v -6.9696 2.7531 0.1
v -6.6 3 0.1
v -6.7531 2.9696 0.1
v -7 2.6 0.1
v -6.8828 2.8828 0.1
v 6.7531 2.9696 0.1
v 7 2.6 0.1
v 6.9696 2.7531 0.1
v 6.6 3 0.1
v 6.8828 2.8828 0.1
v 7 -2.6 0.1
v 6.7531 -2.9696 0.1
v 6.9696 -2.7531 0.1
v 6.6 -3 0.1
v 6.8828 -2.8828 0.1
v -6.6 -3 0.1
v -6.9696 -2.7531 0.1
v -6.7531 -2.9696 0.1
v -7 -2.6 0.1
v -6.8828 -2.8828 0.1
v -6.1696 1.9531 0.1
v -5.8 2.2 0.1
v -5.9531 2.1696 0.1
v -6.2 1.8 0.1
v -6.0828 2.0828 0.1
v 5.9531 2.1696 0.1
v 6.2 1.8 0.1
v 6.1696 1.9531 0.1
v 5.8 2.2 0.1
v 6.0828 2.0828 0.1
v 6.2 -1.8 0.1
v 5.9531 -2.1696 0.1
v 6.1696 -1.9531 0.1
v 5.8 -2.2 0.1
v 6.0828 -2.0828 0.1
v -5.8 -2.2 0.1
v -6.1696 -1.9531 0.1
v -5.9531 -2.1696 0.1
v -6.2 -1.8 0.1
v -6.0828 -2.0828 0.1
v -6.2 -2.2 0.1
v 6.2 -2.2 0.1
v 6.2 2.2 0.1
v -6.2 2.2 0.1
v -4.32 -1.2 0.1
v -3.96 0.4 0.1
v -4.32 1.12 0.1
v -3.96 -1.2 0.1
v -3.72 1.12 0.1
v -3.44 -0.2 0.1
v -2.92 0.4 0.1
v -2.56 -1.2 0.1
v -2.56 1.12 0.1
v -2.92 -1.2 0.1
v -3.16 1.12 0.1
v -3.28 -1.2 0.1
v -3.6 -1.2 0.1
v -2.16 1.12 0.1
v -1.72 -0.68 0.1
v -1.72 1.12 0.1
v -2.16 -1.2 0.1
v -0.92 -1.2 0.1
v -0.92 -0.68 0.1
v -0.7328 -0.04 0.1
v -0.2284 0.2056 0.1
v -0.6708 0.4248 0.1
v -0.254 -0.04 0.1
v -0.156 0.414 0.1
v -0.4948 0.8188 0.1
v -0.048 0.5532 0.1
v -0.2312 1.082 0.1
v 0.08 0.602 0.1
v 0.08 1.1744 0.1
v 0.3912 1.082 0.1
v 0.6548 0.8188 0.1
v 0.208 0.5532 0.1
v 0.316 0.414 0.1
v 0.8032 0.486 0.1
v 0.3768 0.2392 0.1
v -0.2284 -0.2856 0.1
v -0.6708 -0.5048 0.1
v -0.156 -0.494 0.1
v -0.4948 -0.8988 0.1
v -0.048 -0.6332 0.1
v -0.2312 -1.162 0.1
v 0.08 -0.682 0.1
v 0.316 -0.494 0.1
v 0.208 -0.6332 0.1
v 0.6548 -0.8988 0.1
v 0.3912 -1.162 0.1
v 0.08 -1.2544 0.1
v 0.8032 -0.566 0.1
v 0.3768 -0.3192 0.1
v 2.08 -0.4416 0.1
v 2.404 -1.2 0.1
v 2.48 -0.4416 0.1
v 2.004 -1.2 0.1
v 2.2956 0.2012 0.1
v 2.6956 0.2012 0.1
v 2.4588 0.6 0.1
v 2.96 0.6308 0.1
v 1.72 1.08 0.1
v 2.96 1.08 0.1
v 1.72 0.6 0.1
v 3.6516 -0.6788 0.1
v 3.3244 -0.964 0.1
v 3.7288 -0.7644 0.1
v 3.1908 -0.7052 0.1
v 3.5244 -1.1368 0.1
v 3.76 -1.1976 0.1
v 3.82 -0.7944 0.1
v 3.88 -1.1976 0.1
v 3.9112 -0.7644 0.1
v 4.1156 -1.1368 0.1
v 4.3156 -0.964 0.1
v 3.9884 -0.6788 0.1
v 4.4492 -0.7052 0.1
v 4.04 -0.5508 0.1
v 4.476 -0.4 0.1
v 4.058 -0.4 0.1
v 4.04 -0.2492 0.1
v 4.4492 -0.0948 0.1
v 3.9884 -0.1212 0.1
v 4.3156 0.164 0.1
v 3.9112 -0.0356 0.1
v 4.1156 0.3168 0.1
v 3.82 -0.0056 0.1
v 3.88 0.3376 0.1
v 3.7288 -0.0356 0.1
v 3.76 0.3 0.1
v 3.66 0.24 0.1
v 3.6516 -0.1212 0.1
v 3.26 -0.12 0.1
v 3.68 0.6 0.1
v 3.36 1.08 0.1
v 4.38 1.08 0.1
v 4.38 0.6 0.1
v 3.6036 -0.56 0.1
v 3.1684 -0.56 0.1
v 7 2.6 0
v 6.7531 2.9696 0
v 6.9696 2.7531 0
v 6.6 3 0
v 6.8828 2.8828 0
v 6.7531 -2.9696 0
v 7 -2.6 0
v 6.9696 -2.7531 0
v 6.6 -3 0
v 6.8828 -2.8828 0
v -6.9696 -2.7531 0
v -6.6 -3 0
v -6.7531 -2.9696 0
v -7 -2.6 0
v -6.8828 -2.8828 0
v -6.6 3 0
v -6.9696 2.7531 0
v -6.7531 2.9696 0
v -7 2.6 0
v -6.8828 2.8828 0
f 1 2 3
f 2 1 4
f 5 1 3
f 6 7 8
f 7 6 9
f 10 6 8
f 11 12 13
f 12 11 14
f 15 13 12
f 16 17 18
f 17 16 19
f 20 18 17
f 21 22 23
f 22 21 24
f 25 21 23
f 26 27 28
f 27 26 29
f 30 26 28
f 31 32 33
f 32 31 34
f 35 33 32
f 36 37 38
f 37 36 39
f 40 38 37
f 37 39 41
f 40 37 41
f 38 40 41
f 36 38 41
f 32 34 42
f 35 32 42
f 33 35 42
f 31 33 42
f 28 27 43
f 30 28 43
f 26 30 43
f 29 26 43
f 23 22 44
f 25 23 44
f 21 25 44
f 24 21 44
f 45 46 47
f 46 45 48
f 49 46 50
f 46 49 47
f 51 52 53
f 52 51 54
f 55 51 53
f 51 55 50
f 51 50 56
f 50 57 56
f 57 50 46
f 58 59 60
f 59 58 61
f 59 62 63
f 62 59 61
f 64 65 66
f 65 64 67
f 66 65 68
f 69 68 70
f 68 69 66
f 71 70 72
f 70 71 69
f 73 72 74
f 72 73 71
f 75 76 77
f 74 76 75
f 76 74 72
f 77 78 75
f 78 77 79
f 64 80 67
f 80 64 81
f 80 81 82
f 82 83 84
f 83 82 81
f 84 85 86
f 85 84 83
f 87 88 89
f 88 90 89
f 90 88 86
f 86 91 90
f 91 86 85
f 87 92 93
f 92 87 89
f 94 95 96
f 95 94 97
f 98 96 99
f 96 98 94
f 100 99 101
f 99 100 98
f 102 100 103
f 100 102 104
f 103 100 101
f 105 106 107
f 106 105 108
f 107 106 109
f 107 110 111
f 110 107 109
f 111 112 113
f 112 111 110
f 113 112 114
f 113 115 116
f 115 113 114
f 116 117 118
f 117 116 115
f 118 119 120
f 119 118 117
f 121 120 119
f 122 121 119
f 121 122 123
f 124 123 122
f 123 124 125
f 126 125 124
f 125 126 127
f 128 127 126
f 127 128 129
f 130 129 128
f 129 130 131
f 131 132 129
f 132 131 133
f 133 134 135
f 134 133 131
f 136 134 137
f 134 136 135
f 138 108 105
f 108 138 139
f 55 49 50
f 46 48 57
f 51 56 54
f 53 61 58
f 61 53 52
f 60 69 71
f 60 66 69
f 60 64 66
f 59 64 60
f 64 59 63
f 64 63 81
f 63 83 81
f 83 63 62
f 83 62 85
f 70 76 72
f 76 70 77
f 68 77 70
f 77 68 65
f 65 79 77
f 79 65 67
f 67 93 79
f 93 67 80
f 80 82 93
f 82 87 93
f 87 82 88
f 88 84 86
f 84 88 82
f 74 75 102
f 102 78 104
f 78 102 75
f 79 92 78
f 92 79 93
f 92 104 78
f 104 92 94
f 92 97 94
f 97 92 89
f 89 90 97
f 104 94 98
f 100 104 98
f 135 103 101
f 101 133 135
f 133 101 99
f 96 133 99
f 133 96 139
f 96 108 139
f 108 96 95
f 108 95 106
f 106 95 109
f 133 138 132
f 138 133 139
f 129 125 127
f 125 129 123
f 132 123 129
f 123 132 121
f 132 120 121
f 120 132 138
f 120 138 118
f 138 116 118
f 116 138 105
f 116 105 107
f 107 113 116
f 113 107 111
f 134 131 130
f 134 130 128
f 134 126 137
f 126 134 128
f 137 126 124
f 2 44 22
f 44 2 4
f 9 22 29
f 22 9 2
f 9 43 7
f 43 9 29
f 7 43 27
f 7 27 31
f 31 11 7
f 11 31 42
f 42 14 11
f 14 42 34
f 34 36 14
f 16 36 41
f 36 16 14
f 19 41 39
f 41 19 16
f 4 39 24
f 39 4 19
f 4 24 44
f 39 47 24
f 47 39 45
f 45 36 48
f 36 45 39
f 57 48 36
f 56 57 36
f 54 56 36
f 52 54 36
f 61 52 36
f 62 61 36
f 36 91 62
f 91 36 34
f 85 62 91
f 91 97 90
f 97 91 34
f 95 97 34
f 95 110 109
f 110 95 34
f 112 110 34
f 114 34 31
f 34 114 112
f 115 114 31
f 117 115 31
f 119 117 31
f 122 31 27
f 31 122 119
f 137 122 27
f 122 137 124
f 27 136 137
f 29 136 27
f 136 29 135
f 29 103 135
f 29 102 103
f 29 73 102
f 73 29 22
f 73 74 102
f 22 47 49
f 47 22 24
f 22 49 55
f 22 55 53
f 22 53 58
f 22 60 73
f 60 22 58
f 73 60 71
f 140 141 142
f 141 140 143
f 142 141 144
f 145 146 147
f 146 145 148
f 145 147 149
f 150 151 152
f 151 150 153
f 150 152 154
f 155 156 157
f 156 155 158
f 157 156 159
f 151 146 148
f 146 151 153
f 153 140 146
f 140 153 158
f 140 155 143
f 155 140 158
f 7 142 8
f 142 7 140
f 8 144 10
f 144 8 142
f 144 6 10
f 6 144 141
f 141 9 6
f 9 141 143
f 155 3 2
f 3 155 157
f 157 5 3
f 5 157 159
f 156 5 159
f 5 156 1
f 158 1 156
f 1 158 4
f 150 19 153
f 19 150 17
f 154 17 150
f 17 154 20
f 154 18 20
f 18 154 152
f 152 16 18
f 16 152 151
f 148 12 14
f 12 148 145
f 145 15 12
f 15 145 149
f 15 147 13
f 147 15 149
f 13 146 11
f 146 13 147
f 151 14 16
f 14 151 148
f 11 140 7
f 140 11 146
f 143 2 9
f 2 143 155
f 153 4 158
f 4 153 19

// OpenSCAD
// file: ../p/1-4ndis.scad
use <../lib.scad>
function ldraw_lib__1_4ndis() = [
// 0 Disc Negative 0.25
// 0 Name: 1-4ndis.dat
// 0 Author: James Jessiman
// 0 !LDRAW_ORG Primitive UPDATE 2012-01
// 0 !LICENSE Licensed under CC BY 4.0 : see CAreadme.txt
// 
// 0 BFC CERTIFY CCW
  [0,"BFC","CERTIFY"],
  [0,"BFC","CCW"],
// 
// 0 !HISTORY 2002-03-23 [sbliss] Added BFC Statement
// 0 !HISTORY 2002-04-25 [PTadmin] Official Update 2002-02
// 0 !HISTORY 2007-06-22 [PTadmin] Header formatted for Contributor Agreement
// 0 !HISTORY 2008-07-01 [PTadmin] Official Update 2008-01
// 0 !HISTORY 2012-02-16 [Philo] Changed to CCW
// 0 !HISTORY 2012-03-30 [PTadmin] Official Update 2012-01
// 
// 
// 3 16 0.9239 0 0.3827 1 0 0 1 0 1
  [3,16,0.9239,0,0.3827,1,0,0,1,0,1],
// 3 16 0.7071 0 0.7071 0.9239 0 0.3827 1 0 1
  [3,16,0.7071,0,0.7071,0.9239,0,0.3827,1,0,1],
// 3 16 0.3827 0 0.9239 0.7071 0 0.7071 1 0 1
  [3,16,0.3827,0,0.9239,0.7071,0,0.7071,1,0,1],
// 3 16 0 0 1 0.3827 0 0.9239 1 0 1
  [3,16,0,0,1,0.3827,0,0.9239,1,0,1],
];
module ldraw_lib__1_4ndis(step=0, col=false, unit=2/5, alt=false, line=0.2, solid=!$preview)
    makepoly(ldraw_lib__1_4ndis(), step=step, col=col, unit=unit, alt=alt, line=line, solid=solid);
ldraw_lib__1_4ndis(line=0.2);
// file: ../p/1-4cyli.scad
use <../lib.scad>
function ldraw_lib__1_4cyli() = [
// 0 Cylinder 0.25
// 0 Name: 1-4cyli.dat
// 0 Author: James Jessiman
// 0 !LDRAW_ORG Primitive UPDATE 2012-01
// 0 !LICENSE Licensed under CC BY 4.0 : see CAreadme.txt
// 
// 0 BFC CERTIFY CCW
  [0,"BFC","CERTIFY"],
  [0,"BFC","CCW"],
// 
// 0 !HISTORY 2002-03-23 [sbliss] Added BFC statement.
// 0 !HISTORY 2002-04-25 [PTadmin] Official Update 2002-02
// 0 !HISTORY 2007-06-22 [PTadmin] Header formatted for Contributor Agreement
// 0 !HISTORY 2008-07-01 [PTadmin] Official Update 2008-01
// 0 !HISTORY 2012-02-16 [Philo] Changed to CCW
// 0 !HISTORY 2012-03-30 [PTadmin] Official Update 2012-01
// 
// 
// 4 16 1 1 0 0.9239 1 0.3827 0.9239 0 0.3827 1 0 0
  [4,16,1,1,0,0.9239,1,0.3827,0.9239,0,0.3827,1,0,0],
// 5 24 1 0 0 1 1 0 0.9239 0 0.3827 1 0 -1
  [5,24,1,0,0,1,1,0,0.9239,0,0.3827,1,0,-1],
// 4 16 0.9239 1 0.3827 0.7071 1 0.7071 0.7071 0 0.7071 0.9239 0 0.3827
  [4,16,0.9239,1,0.3827,0.7071,1,0.7071,0.7071,0,0.7071,0.9239,0,0.3827],
// 5 24 0.9239 0 0.3827 0.9239 1 0.3827 0.7071 0 0.7071 1 0 0
  [5,24,0.9239,0,0.3827,0.9239,1,0.3827,0.7071,0,0.7071,1,0,0],
// 4 16 0.7071 1 0.7071 0.3827 1 0.9239 0.3827 0 0.9239 0.7071 0 0.7071
  [4,16,0.7071,1,0.7071,0.3827,1,0.9239,0.3827,0,0.9239,0.7071,0,0.7071],
// 5 24 0.7071 0 0.7071 0.7071 1 0.7071 0.3827 0 0.9239 0.9239 0 0.3827
  [5,24,0.7071,0,0.7071,0.7071,1,0.7071,0.3827,0,0.9239,0.9239,0,0.3827],
// 4 16 0.3827 1 0.9239 0 1 1 0 0 1 0.3827 0 0.9239
  [4,16,0.3827,1,0.9239,0,1,1,0,0,1,0.3827,0,0.9239],
// 5 24 0.3827 0 0.9239 0.3827 1 0.9239 0 0 1 0.7071 0 0.7071
  [5,24,0.3827,0,0.9239,0.3827,1,0.9239,0,0,1,0.7071,0,0.7071],
// 5 24 0 0 1 0 1 1 0.3827 0 0.9239 -1 0 1
  [5,24,0,0,1,0,1,1,0.3827,0,0.9239,-1,0,1],
];
module ldraw_lib__1_4cyli(step=0, col=false, unit=2/5, alt=false, line=0.2, solid=!$preview)
    makepoly(ldraw_lib__1_4cyli(), step=step, col=col, unit=unit, alt=alt, line=line, solid=solid);
ldraw_lib__1_4cyli(line=0.2);
// file: ../p/1-4chrd.scad
use <../lib.scad>
function ldraw_lib__1_4chrd() = [
// 0 Chord 0.25
// 0 Name: 1-4chrd.dat
// 0 Author: Max Martin Richter [MMR1988]
// 0 !LDRAW_ORG Primitive UPDATE 2023-05
// 0 !LICENSE Licensed under CC BY 4.0 : see CAreadme.txt
// 
// 0 BFC CERTIFY CCW
  [0,"BFC","CERTIFY"],
  [0,"BFC","CCW"],
// 
// 0 !HISTORY 2004-04-22 [PTadmin] Official Update 2004-02
// 0 !HISTORY 2007-10-09 [PTadmin] Header formatted for Contributor Agreement
// 0 !HISTORY 2008-07-01 [PTadmin] Official Update 2008-01
// 0 !HISTORY 2012-08-02 [MMR1988] Re-creation with PrimGen2 and Rectifier
// 0 !HISTORY 2012-08-09 [PTadmin] Official Update 2012-02
// 0 !HISTORY 2023-10-27 [OrionP] Change author to MMR1988 from hafhead
// 0 !HISTORY 2023-10-31 [OrionP] Official Update 2023-05
// 
// 4 16 0.9239 0 0.3827 0.3827 0 0.9239 0 0 1 1 0 0
  [4,16,0.9239,0,0.3827,0.3827,0,0.9239,0,0,1,1,0,0],
// 3 16 0.7071 0 0.7071 0.3827 0 0.9239 0.9239 0 0.3827
  [3,16,0.7071,0,0.7071,0.3827,0,0.9239,0.9239,0,0.3827],
];
module ldraw_lib__1_4chrd(step=0, col=false, unit=2/5, alt=false, line=0.2, solid=!$preview)
    makepoly(ldraw_lib__1_4chrd(), step=step, col=col, unit=unit, alt=alt, line=line, solid=solid);
ldraw_lib__1_4chrd(line=0.2);
// main file
use <../lib.scad>
use <../p/1-4chrd.scad>
use <../p/1-4cyli.scad>
use <../p/1-4ndis.scad>
function ldraw_lib__6152075a() = [
// 0 Sticker  0.7 x  1.7 with Black "MLC 75" and Black Border
// 0 Name: 6152075a.dat
// 0 Author: Evert-Jan Boer [ejboer]
// 0 !LDRAW_ORG Part UPDATE 2024-08
// 0 !LICENSE Licensed under CC BY 4.0 : see CAreadme.txt
// 
// 0 BFC CERTIFY CCW
  [0,"BFC","CERTIFY"],
  [0,"BFC","CCW"],
// 
// 0 !KEYWORDS London Mini Bus, Set 40220
// 
// 0 !HISTORY 2024-09-30 [OrionP] Official Update 2024-08
// 
// 
// 1 0 -16.5 -.25 6.5 0 0 -1 0 1 0 1 0 0 1-4chrd.dat
  [1,0,-16.5,-.25,6.5,0,0,-1,0,1,0,1,0,0, ldraw_lib__1_4chrd()],
// 1 0 16.5 -.25 6.5 1 0 0 0 1 0 0 0 1 1-4chrd.dat
  [1,0,16.5,-.25,6.5,1,0,0,0,1,0,0,0,1, ldraw_lib__1_4chrd()],
// 1 0 16.5 -.25 -6.5 0 0 1 0 1 0 -1 0 0 1-4chrd.dat
  [1,0,16.5,-.25,-6.5,0,0,1,0,1,0,-1,0,0, ldraw_lib__1_4chrd()],
// 1 0 -16.5 -.25 -6.5 -1 0 0 0 1 0 0 0 -1 1-4chrd.dat
  [1,0,-16.5,-.25,-6.5,-1,0,0,0,1,0,0,0,-1, ldraw_lib__1_4chrd()],
// 1 15 -14.5 -.25 4.5 0 0 -1 0 1 0 1 0 0 1-4chrd.dat
  [1,15,-14.5,-.25,4.5,0,0,-1,0,1,0,1,0,0, ldraw_lib__1_4chrd()],
// 1 15 14.5 -.25 4.5 1 0 0 0 1 0 0 0 1 1-4chrd.dat
  [1,15,14.5,-.25,4.5,1,0,0,0,1,0,0,0,1, ldraw_lib__1_4chrd()],
// 1 15 14.5 -.25 -4.5 0 0 1 0 1 0 -1 0 0 1-4chrd.dat
  [1,15,14.5,-.25,-4.5,0,0,1,0,1,0,-1,0,0, ldraw_lib__1_4chrd()],
// 1 15 -14.5 -.25 -4.5 -1 0 0 0 1 0 0 0 -1 1-4chrd.dat
  [1,15,-14.5,-.25,-4.5,-1,0,0,0,1,0,0,0,-1, ldraw_lib__1_4chrd()],
// 1 0 -14.5 -.25 -4.5 -1 0 0 0 1 0 0 0 -1 1-4ndis.dat
  [1,0,-14.5,-.25,-4.5,-1,0,0,0,1,0,0,0,-1, ldraw_lib__1_4ndis()],
// 1 0 14.5 -.25 -4.5 0 0 1 0 1 0 -1 0 0 1-4ndis.dat
  [1,0,14.5,-.25,-4.5,0,0,1,0,1,0,-1,0,0, ldraw_lib__1_4ndis()],
// 1 0 14.5 -.25 4.5 1 0 0 0 1 0 0 0 1 1-4ndis.dat
  [1,0,14.5,-.25,4.5,1,0,0,0,1,0,0,0,1, ldraw_lib__1_4ndis()],
// 1 0 -14.5 -.25 4.5 0 0 -1 0 1 0 1 0 0 1-4ndis.dat
  [1,0,-14.5,-.25,4.5,0,0,-1,0,1,0,1,0,0, ldraw_lib__1_4ndis()],
// 4 0 -9.9 -.25 1 -10.8 -.25 2.8 -10.8 -.25 -3 -9.9 -.25 -3
  [4,0,-9.9,-.25,1,-10.8,-.25,2.8,-10.8,-.25,-3,-9.9,-.25,-3],
// 4 0 -8.6 -.25 -.5 -9.3 -.25 2.8 -10.8 -.25 2.8 -9.9 -.25 1
  [4,0,-8.6,-.25,-.5,-9.3,-.25,2.8,-10.8,-.25,2.8,-9.9,-.25,1],
// 4 0 -7.3 -.25 1 -7.3 -.25 -3 -6.4 -.25 -3 -6.4 -.25 2.8
  [4,0,-7.3,-.25,1,-7.3,-.25,-3,-6.4,-.25,-3,-6.4,-.25,2.8],
// 4 0 -6.4 -.25 2.8 -7.9 -.25 2.8 -8.6 -.25 -.5 -7.3 -.25 1
  [4,0,-6.4,-.25,2.8,-7.9,-.25,2.8,-8.6,-.25,-.5,-7.3,-.25,1],
// 3 0 -7.3 -.25 1 -8.6 -.25 -.5 -8.2 -.25 -3
  [3,0,-7.3,-.25,1,-8.6,-.25,-.5,-8.2,-.25,-3],
// 4 0 -9.9 -.25 1 -9 -.25 -3 -8.2 -.25 -3 -8.6 -.25 -.5
  [4,0,-9.9,-.25,1,-9,-.25,-3,-8.2,-.25,-3,-8.6,-.25,-.5],
// 4 0 -5.4 -.25 -3 -4.3 -.25 -1.7 -4.3 -.25 2.8 -5.4 -.25 2.8
  [4,0,-5.4,-.25,-3,-4.3,-.25,-1.7,-4.3,-.25,2.8,-5.4,-.25,2.8],
// 4 0 -2.3 -.25 -3 -2.3 -.25 -1.7 -4.3 -.25 -1.7 -5.4 -.25 -3
  [4,0,-2.3,-.25,-3,-2.3,-.25,-1.7,-4.3,-.25,-1.7,-5.4,-.25,-3],
// 4 0 -1.832 -.25 -.1 -.635 -.25 -.1 -.571 -.25 .514 -1.677 -.25 1.062
  [4,0,-1.832,-.25,-.1,-.635,-.25,-.1,-.571,-.25,.514,-1.677,-.25,1.062],
// 3 0 -1.677 -.25 1.062 -.571 -.25 .514 -.39 -.25 1.035
  [3,0,-1.677,-.25,1.062,-.571,-.25,.514,-.39,-.25,1.035],
// 4 0 -1.677 -.25 1.062 -.39 -.25 1.035 -.12 -.25 1.383 -1.237 -.25 2.047
  [4,0,-1.677,-.25,1.062,-.39,-.25,1.035,-.12,-.25,1.383,-1.237,-.25,2.047],
// 4 0 -1.237 -.25 2.047 -.12 -.25 1.383 .2 -.25 1.505 -.578 -.25 2.705
  [4,0,-1.237,-.25,2.047,-.12,-.25,1.383,.2,-.25,1.505,-.578,-.25,2.705],
// 4 0 .978 -.25 2.705 .2 -.25 2.936 -.578 -.25 2.705 .2 -.25 1.505
  [4,0,.978,-.25,2.705,.2,-.25,2.936,-.578,-.25,2.705,.2,-.25,1.505],
// 3 0 1.637 -.25 2.047 .52 -.25 1.383 .79 -.25 1.035
  [3,0,1.637,-.25,2.047,.52,-.25,1.383,.79,-.25,1.035],
// 4 0 1.637 -.25 2.047 .978 -.25 2.705 .2 -.25 1.505 .52 -.25 1.383
  [4,0,1.637,-.25,2.047,.978,-.25,2.705,.2,-.25,1.505,.52,-.25,1.383],
// 4 0 2.008 -.25 1.215 1.637 -.25 2.047 .79 -.25 1.035 .942 -.25 .598
  [4,0,2.008,-.25,1.215,1.637,-.25,2.047,.79,-.25,1.035,.942,-.25,.598],
// 4 0 -.571 -.25 -.714 -.635 -.25 -.1 -1.832 -.25 -.1 -1.677 -.25 -1.262
  [4,0,-.571,-.25,-.714,-.635,-.25,-.1,-1.832,-.25,-.1,-1.677,-.25,-1.262],
// 3 0 -.571 -.25 -.714 -1.677 -.25 -1.262 -.39 -.25 -1.235
  [3,0,-.571,-.25,-.714,-1.677,-.25,-1.262,-.39,-.25,-1.235],
// 4 0 -1.677 -.25 -1.262 -1.237 -.25 -2.247 -.12 -.25 -1.583 -.39 -.25 -1.235
  [4,0,-1.677,-.25,-1.262,-1.237,-.25,-2.247,-.12,-.25,-1.583,-.39,-.25,-1.235],
// 4 0 -1.237 -.25 -2.247 -.578 -.25 -2.905 .2 -.25 -1.705 -.12 -.25 -1.583
  [4,0,-1.237,-.25,-2.247,-.578,-.25,-2.905,.2,-.25,-1.705,-.12,-.25,-1.583],
// 3 0 .79 -.25 -1.235 .52 -.25 -1.583 1.637 -.25 -2.247
  [3,0,.79,-.25,-1.235,.52,-.25,-1.583,1.637,-.25,-2.247],
// 4 0 .2 -.25 -1.705 .978 -.25 -2.905 1.637 -.25 -2.247 .52 -.25 -1.583
  [4,0,.2,-.25,-1.705,.978,-.25,-2.905,1.637,-.25,-2.247,.52,-.25,-1.583],
// 4 0 -.578 -.25 -2.905 .2 -.25 -3.136 .978 -.25 -2.905 .2 -.25 -1.705
  [4,0,-.578,-.25,-2.905,.2,-.25,-3.136,.978,-.25,-2.905,.2,-.25,-1.705],
// 4 0 .79 -.25 -1.235 1.637 -.25 -2.247 2.008 -.25 -1.415 .942 -.25 -.798
  [4,0,.79,-.25,-1.235,1.637,-.25,-2.247,2.008,-.25,-1.415,.942,-.25,-.798],
// 4 0 5.01 -.25 -3 6.01 -.25 -3 6.2 -.25 -1.104 5.2 -.25 -1.104
  [4,0,5.01,-.25,-3,6.01,-.25,-3,6.2,-.25,-1.104,5.2,-.25,-1.104],
// 4 0 5.2 -.25 -1.104 6.2 -.25 -1.104 6.739 -.25 .503 5.739 -.25 .503
  [4,0,5.2,-.25,-1.104,6.2,-.25,-1.104,6.739,-.25,.503,5.739,-.25,.503],
// 4 0 7.4 -.25 1.577 6.147 -.25 1.5 5.739 -.25 .503 6.739 -.25 .503
  [4,0,7.4,-.25,1.577,6.147,-.25,1.5,5.739,-.25,.503,6.739,-.25,.503],
// 4 0 4.3 -.25 2.7 4.3 -.25 1.5 6.147 -.25 1.5 7.4 -.25 2.7
  [4,0,4.3,-.25,2.7,4.3,-.25,1.5,6.147,-.25,1.5,7.4,-.25,2.7],
// 3 0 7.4 -.25 2.7 6.147 -.25 1.5 7.4 -.25 1.577
  [3,0,7.4,-.25,2.7,6.147,-.25,1.5,7.4,-.25,1.577],
// 4 0 7.977 -.25 -1.763 8.311 -.25 -2.41 9.322 -.25 -1.911 9.129 -.25 -1.697
  [4,0,7.977,-.25,-1.763,8.311,-.25,-2.41,9.322,-.25,-1.911,9.129,-.25,-1.697],
// 3 0 9.322 -.25 -1.911 8.311 -.25 -2.41 8.811 -.25 -2.842
  [3,0,9.322,-.25,-1.911,8.311,-.25,-2.41,8.811,-.25,-2.842],
// 4 0 9.322 -.25 -1.911 8.811 -.25 -2.842 9.4 -.25 -2.994 9.55 -.25 -1.986
  [4,0,9.322,-.25,-1.911,8.811,-.25,-2.842,9.4,-.25,-2.994,9.55,-.25,-1.986],
// 4 0 9.4 -.25 -2.994 9.7 -.25 -2.994 9.778 -.25 -1.911 9.55 -.25 -1.986
  [4,0,9.4,-.25,-2.994,9.7,-.25,-2.994,9.778,-.25,-1.911,9.55,-.25,-1.986],
// 3 0 9.778 -.25 -1.911 9.7 -.25 -2.994 10.289 -.25 -2.842
  [3,0,9.778,-.25,-1.911,9.7,-.25,-2.994,10.289,-.25,-2.842],
// 4 0 9.778 -.25 -1.911 10.289 -.25 -2.842 10.789 -.25 -2.41 9.971 -.25 -1.697
  [4,0,9.778,-.25,-1.911,10.289,-.25,-2.842,10.789,-.25,-2.41,9.971,-.25,-1.697],
// 4 0 11.123 -.25 -1.763 10.1 -.25 -1.377 9.971 -.25 -1.697 10.789 -.25 -2.41
  [4,0,11.123,-.25,-1.763,10.1,-.25,-1.377,9.971,-.25,-1.697,10.789,-.25,-2.41],
// 4 0 10.1 -.25 -1.377 11.123 -.25 -1.763 11.19 -.25 -1 10.145 -.25 -1
  [4,0,10.1,-.25,-1.377,11.123,-.25,-1.763,11.19,-.25,-1,10.145,-.25,-1],
// 3 0 10.1 -.25 -.623 10.145 -.25 -1 11.19 -.25 -1
  [3,0,10.1,-.25,-.623,10.145,-.25,-1,11.19,-.25,-1],
// 4 0 11.19 -.25 -1 11.123 -.25 -.237 9.971 -.25 -.303 10.1 -.25 -.623
  [4,0,11.19,-.25,-1,11.123,-.25,-.237,9.971,-.25,-.303,10.1,-.25,-.623],
// 4 0 9.778 -.25 -.089 9.971 -.25 -.303 11.123 -.25 -.237 10.789 -.25 .41
  [4,0,9.778,-.25,-.089,9.971,-.25,-.303,11.123,-.25,-.237,10.789,-.25,.41],
// 4 0 9.55 -.25 -.014 9.778 -.25 -.089 10.789 -.25 .41 10.289 -.25 .792
  [4,0,9.55,-.25,-.014,9.778,-.25,-.089,10.789,-.25,.41,10.289,-.25,.792],
// 4 0 9.322 -.25 -.089 9.55 -.25 -.014 10.289 -.25 .792 9.7 -.25 .844
  [4,0,9.322,-.25,-.089,9.55,-.25,-.014,10.289,-.25,.792,9.7,-.25,.844],
// 4 0 9.15 -.25 .6 9.322 -.25 -.089 9.7 -.25 .844 9.4 -.25 .75
  [4,0,9.15,-.25,.6,9.322,-.25,-.089,9.7,-.25,.844,9.4,-.25,.75],
// 4 0 8.15 -.25 -.3 9.129 -.25 -.303 9.322 -.25 -.089 9.15 -.25 .6
  [4,0,8.15,-.25,-.3,9.129,-.25,-.303,9.322,-.25,-.089,9.15,-.25,.6],
// 4 0 8.4 -.25 2.7 8.15 -.25 -.3 9.15 -.25 .6 9.2 -.25 1.5
  [4,0,8.4,-.25,2.7,8.15,-.25,-.3,9.15,-.25,.6,9.2,-.25,1.5],
// 4 0 8.4 -.25 2.7 9.2 -.25 1.5 10.95 -.25 1.5 10.95 -.25 2.7
  [4,0,8.4,-.25,2.7,9.2,-.25,1.5,10.95,-.25,1.5,10.95,-.25,2.7],
// 4 0 7.921 -.25 -1.4 7.977 -.25 -1.763 9.129 -.25 -1.697 9.009 -.25 -1.4
  [4,0,7.921,-.25,-1.4,7.977,-.25,-1.763,9.129,-.25,-1.697,9.009,-.25,-1.4],
// 3 15 -7.9 -.25 2.8 -9.3 -.25 2.8 -8.6 -.25 -.5
  [3,15,-7.9,-.25,2.8,-9.3,-.25,2.8,-8.6,-.25,-.5],
// 3 15 -9.9 -.25 1 -9.9 -.25 -3 -9 -.25 -3
  [3,15,-9.9,-.25,1,-9.9,-.25,-3,-9,-.25,-3],
// 3 15 -7.3 -.25 1 -8.2 -.25 -3 -7.3 -.25 -3
  [3,15,-7.3,-.25,1,-8.2,-.25,-3,-7.3,-.25,-3],
// 4 15 -5.4 -.25 -3 -5.4 -.25 2.8 -6.4 -.25 2.8 -6.4 -.25 -3
  [4,15,-5.4,-.25,-3,-5.4,-.25,2.8,-6.4,-.25,2.8,-6.4,-.25,-3],
// 3 15 -4.3 -.25 2.8 -1.237 -.25 2.047 -.578 -.25 2.705
  [3,15,-4.3,-.25,2.8,-1.237,-.25,2.047,-.578,-.25,2.705],
// 3 15 -4.3 -.25 2.8 -1.677 -.25 1.062 -1.237 -.25 2.047
  [3,15,-4.3,-.25,2.8,-1.677,-.25,1.062,-1.237,-.25,2.047],
// 3 15 -4.3 -.25 2.8 -1.832 -.25 -.1 -1.677 -.25 1.062
  [3,15,-4.3,-.25,2.8,-1.832,-.25,-.1,-1.677,-.25,1.062],
// 4 15 -1.832 -.25 -.1 -4.3 -.25 2.8 -4.3 -.25 -1.7 -2.3 -.25 -1.7
  [4,15,-1.832,-.25,-.1,-4.3,-.25,2.8,-4.3,-.25,-1.7,-2.3,-.25,-1.7],
// 3 15 -1.832 -.25 -.1 -2.3 -.25 -1.7 -1.677 -.25 -1.262
  [3,15,-1.832,-.25,-.1,-2.3,-.25,-1.7,-1.677,-.25,-1.262],
// 4 15 -2.3 -.25 -3 -1.237 -.25 -2.247 -1.677 -.25 -1.262 -2.3 -.25 -1.7
  [4,15,-2.3,-.25,-3,-1.237,-.25,-2.247,-1.677,-.25,-1.262,-2.3,-.25,-1.7],
// 3 15 -1.237 -.25 -2.247 -2.3 -.25 -3 -.578 -.25 -2.905
  [3,15,-1.237,-.25,-2.247,-2.3,-.25,-3,-.578,-.25,-2.905],
// 4 15 .2 -.25 1.505 -.12 -.25 1.383 .79 -.25 1.035 .52 -.25 1.383
  [4,15,.2,-.25,1.505,-.12,-.25,1.383,.79,-.25,1.035,.52,-.25,1.383],
// 4 15 -.571 -.25 .514 .79 -.25 1.035 -.12 -.25 1.383 -.39 -.25 1.035
  [4,15,-.571,-.25,.514,.79,-.25,1.035,-.12,-.25,1.383,-.39,-.25,1.035],
// 4 15 .79 -.25 1.035 -.571 -.25 .514 -.635 -.25 -.1 .942 -.25 .598
  [4,15,.79,-.25,1.035,-.571,-.25,.514,-.635,-.25,-.1,.942,-.25,.598],
// 4 15 .942 -.25 .598 -.635 -.25 -.1 -.571 -.25 -.714 .942 -.25 -.798
  [4,15,.942,-.25,.598,-.635,-.25,-.1,-.571,-.25,-.714,.942,-.25,-.798],
// 3 15 -.571 -.25 -.714 -.39 -.25 -1.235 .942 -.25 -.798
  [3,15,-.571,-.25,-.714,-.39,-.25,-1.235,.942,-.25,-.798],
// 4 15 .52 -.25 -1.583 .79 -.25 -1.235 .942 -.25 -.798 -.39 -.25 -1.235
  [4,15,.52,-.25,-1.583,.79,-.25,-1.235,.942,-.25,-.798,-.39,-.25,-1.235],
// 4 15 -.39 -.25 -1.235 -.12 -.25 -1.583 .2 -.25 -1.705 .52 -.25 -1.583
  [4,15,-.39,-.25,-1.235,-.12,-.25,-1.583,.2,-.25,-1.705,.52,-.25,-1.583],
// 3 15 .978 -.25 2.705 1.637 -.25 2.047 4.3 -.25 2.7
  [3,15,.978,-.25,2.705,1.637,-.25,2.047,4.3,-.25,2.7],
// 4 15 4.3 -.25 2.7 1.637 -.25 2.047 2.008 -.25 1.215 4.3 -.25 1.5
  [4,15,4.3,-.25,2.7,1.637,-.25,2.047,2.008,-.25,1.215,4.3,-.25,1.5],
// 4 15 2.008 -.25 -1.415 2.008 -.25 1.215 .942 -.25 .598 .942 -.25 -.798
  [4,15,2.008,-.25,-1.415,2.008,-.25,1.215,.942,-.25,.598,.942,-.25,-.798],
// 4 15 5.2 -.25 -1.104 4.3 -.25 1.5 2.008 -.25 1.215 2.008 -.25 -1.415
  [4,15,5.2,-.25,-1.104,4.3,-.25,1.5,2.008,-.25,1.215,2.008,-.25,-1.415],
// 4 15 1.637 -.25 -2.247 5.01 -.25 -3 5.2 -.25 -1.104 2.008 -.25 -1.415
  [4,15,1.637,-.25,-2.247,5.01,-.25,-3,5.2,-.25,-1.104,2.008,-.25,-1.415],
// 3 15 1.637 -.25 -2.247 .978 -.25 -2.905 5.01 -.25 -3
  [3,15,1.637,-.25,-2.247,.978,-.25,-2.905,5.01,-.25,-3],
// 3 15 4.3 -.25 1.5 5.2 -.25 -1.104 5.739 -.25 .503
  [3,15,4.3,-.25,1.5,5.2,-.25,-1.104,5.739,-.25,.503],
// 3 15 6.147 -.25 1.5 4.3 -.25 1.5 5.739 -.25 .503
  [3,15,6.147,-.25,1.5,4.3,-.25,1.5,5.739,-.25,.503],
// 3 15 8.4 -.25 2.7 7.4 -.25 2.7 7.4 -.25 1.577
  [3,15,8.4,-.25,2.7,7.4,-.25,2.7,7.4,-.25,1.577],
// 4 15 8.4 -.25 2.7 7.4 -.25 1.577 6.739 -.25 .503 8.15 -.25 -.3
  [4,15,8.4,-.25,2.7,7.4,-.25,1.577,6.739,-.25,.503,8.15,-.25,-.3],
// 4 15 7.921 -.25 -1.4 8.15 -.25 -.3 6.739 -.25 .503 6.2 -.25 -1.104
  [4,15,7.921,-.25,-1.4,8.15,-.25,-.3,6.739,-.25,.503,6.2,-.25,-1.104],
// 4 15 7.977 -.25 -1.763 7.921 -.25 -1.4 6.2 -.25 -1.104 6.01 -.25 -3
  [4,15,7.977,-.25,-1.763,7.921,-.25,-1.4,6.2,-.25,-1.104,6.01,-.25,-3],
// 3 15 7.977 -.25 -1.763 6.01 -.25 -3 8.311 -.25 -2.41
  [3,15,7.977,-.25,-1.763,6.01,-.25,-3,8.311,-.25,-2.41],
// 3 15 8.311 -.25 -2.41 6.01 -.25 -3 8.811 -.25 -2.842
  [3,15,8.311,-.25,-2.41,6.01,-.25,-3,8.811,-.25,-2.842],
// 4 15 7.921 -.25 -1.4 9.009 -.25 -1.4 9.129 -.25 -.303 8.15 -.25 -.3
  [4,15,7.921,-.25,-1.4,9.009,-.25,-1.4,9.129,-.25,-.303,8.15,-.25,-.3],
// 4 15 9.971 -.25 -.303 9.778 -.25 -.089 9.55 -.25 -.014 9.322 -.25 -.089
  [4,15,9.971,-.25,-.303,9.778,-.25,-.089,9.55,-.25,-.014,9.322,-.25,-.089],
// 4 15 10.1 -.25 -.623 9.971 -.25 -.303 9.322 -.25 -.089 9.129 -.25 -.303
  [4,15,10.1,-.25,-.623,9.971,-.25,-.303,9.322,-.25,-.089,9.129,-.25,-.303],
// 4 15 9.009 -.25 -1.4 10.145 -.25 -1 10.1 -.25 -.623 9.129 -.25 -.303
  [4,15,9.009,-.25,-1.4,10.145,-.25,-1,10.1,-.25,-.623,9.129,-.25,-.303],
// 3 15 10.145 -.25 -1 9.009 -.25 -1.4 10.1 -.25 -1.377
  [3,15,10.145,-.25,-1,9.009,-.25,-1.4,10.1,-.25,-1.377],
// 4 15 9.129 -.25 -1.697 9.971 -.25 -1.697 10.1 -.25 -1.377 9.009 -.25 -1.4
  [4,15,9.129,-.25,-1.697,9.971,-.25,-1.697,10.1,-.25,-1.377,9.009,-.25,-1.4],
// 3 15 9.971 -.25 -1.697 9.129 -.25 -1.697 9.322 -.25 -1.911
  [3,15,9.971,-.25,-1.697,9.129,-.25,-1.697,9.322,-.25,-1.911],
// 4 15 9.971 -.25 -1.697 9.322 -.25 -1.911 9.55 -.25 -1.986 9.778 -.25 -1.911
  [4,15,9.971,-.25,-1.697,9.322,-.25,-1.911,9.55,-.25,-1.986,9.778,-.25,-1.911],
// 3 15 9.2 -.25 1.5 9.15 -.25 .6 9.4 -.25 .75
  [3,15,9.2,-.25,1.5,9.15,-.25,.6,9.4,-.25,.75],
// 3 15 9.2 -.25 1.5 9.4 -.25 .75 9.7 -.25 .844
  [3,15,9.2,-.25,1.5,9.4,-.25,.75,9.7,-.25,.844],
// 4 15 9.7 -.25 .844 10.289 -.25 .792 10.95 -.25 1.5 9.2 -.25 1.5
  [4,15,9.7,-.25,.844,10.289,-.25,.792,10.95,-.25,1.5,9.2,-.25,1.5],
// 3 15 10.95 -.25 1.5 10.289 -.25 .792 10.789 -.25 .41
  [3,15,10.95,-.25,1.5,10.289,-.25,.792,10.789,-.25,.41],
// 4 0 -14.5 -.25 5.5 -16.5 -.25 7.5 -17.5 -.25 6.5 -15.5 -.25 5.5
  [4,0,-14.5,-.25,5.5,-16.5,-.25,7.5,-17.5,-.25,6.5,-15.5,-.25,5.5],
// 4 0 -16.5 -.25 7.5 -14.5 -.25 5.5 14.5 -.25 5.5 16.5 -.25 7.5
  [4,0,-16.5,-.25,7.5,-14.5,-.25,5.5,14.5,-.25,5.5,16.5,-.25,7.5],
// 4 0 17.5 -.25 6.5 16.5 -.25 7.5 14.5 -.25 5.5 15.5 -.25 5.5
  [4,0,17.5,-.25,6.5,16.5,-.25,7.5,14.5,-.25,5.5,15.5,-.25,5.5],
// 3 0 17.5 -.25 6.5 15.5 -.25 5.5 15.5 -.25 4.5
  [3,0,17.5,-.25,6.5,15.5,-.25,5.5,15.5,-.25,4.5],
// 3 0 17.5 -.25 6.5 15.5 -.25 4.5 15.5 -.25 -4.5
  [3,0,17.5,-.25,6.5,15.5,-.25,4.5,15.5,-.25,-4.5],
// 4 0 15.5 -.25 -5.5 17.5 -.25 -6.5 17.5 -.25 6.5 15.5 -.25 -4.5
  [4,0,15.5,-.25,-5.5,17.5,-.25,-6.5,17.5,-.25,6.5,15.5,-.25,-4.5],
// 4 0 17.5 -.25 -6.5 15.5 -.25 -5.5 14.5 -.25 -5.5 16.5 -.25 -7.5
  [4,0,17.5,-.25,-6.5,15.5,-.25,-5.5,14.5,-.25,-5.5,16.5,-.25,-7.5],
// 3 0 14.5 -.25 -5.5 -14.5 -.25 -5.5 16.5 -.25 -7.5
  [3,0,14.5,-.25,-5.5,-14.5,-.25,-5.5,16.5,-.25,-7.5],
// 4 0 -15.5 -.25 -5.5 -16.5 -.25 -7.5 16.5 -.25 -7.5 -14.5 -.25 -5.5
  [4,0,-15.5,-.25,-5.5,-16.5,-.25,-7.5,16.5,-.25,-7.5,-14.5,-.25,-5.5],
// 4 0 -15.5 -.25 -4.5 -17.5 -.25 -6.5 -16.5 -.25 -7.5 -15.5 -.25 -5.5
  [4,0,-15.5,-.25,-4.5,-17.5,-.25,-6.5,-16.5,-.25,-7.5,-15.5,-.25,-5.5],
// 4 0 -15.5 -.25 -4.5 -15.5 -.25 4.5 -17.5 -.25 6.5 -17.5 -.25 -6.5
  [4,0,-15.5,-.25,-4.5,-15.5,-.25,4.5,-17.5,-.25,6.5,-17.5,-.25,-6.5],
// 3 0 -17.5 -.25 6.5 -15.5 -.25 4.5 -15.5 -.25 5.5
  [3,0,-17.5,-.25,6.5,-15.5,-.25,4.5,-15.5,-.25,5.5],
// 4 15 -15.5 -.25 -4.5 -10.8 -.25 -3 -10.8 -.25 2.8 -15.5 -.25 4.5
  [4,15,-15.5,-.25,-4.5,-10.8,-.25,-3,-10.8,-.25,2.8,-15.5,-.25,4.5],
// 4 15 -9.9 -.25 -3 -10.8 -.25 -3 -15.5 -.25 -4.5 -14.5 -.25 -5.5
  [4,15,-9.9,-.25,-3,-10.8,-.25,-3,-15.5,-.25,-4.5,-14.5,-.25,-5.5],
// 3 15 -9 -.25 -3 -9.9 -.25 -3 -14.5 -.25 -5.5
  [3,15,-9,-.25,-3,-9.9,-.25,-3,-14.5,-.25,-5.5],
// 3 15 -8.2 -.25 -3 -9 -.25 -3 -14.5 -.25 -5.5
  [3,15,-8.2,-.25,-3,-9,-.25,-3,-14.5,-.25,-5.5],
// 3 15 -7.3 -.25 -3 -8.2 -.25 -3 -14.5 -.25 -5.5
  [3,15,-7.3,-.25,-3,-8.2,-.25,-3,-14.5,-.25,-5.5],
// 3 15 -6.4 -.25 -3 -7.3 -.25 -3 -14.5 -.25 -5.5
  [3,15,-6.4,-.25,-3,-7.3,-.25,-3,-14.5,-.25,-5.5],
// 3 15 -5.4 -.25 -3 -6.4 -.25 -3 -14.5 -.25 -5.5
  [3,15,-5.4,-.25,-3,-6.4,-.25,-3,-14.5,-.25,-5.5],
// 3 15 -2.3 -.25 -3 -5.4 -.25 -3 -14.5 -.25 -5.5
  [3,15,-2.3,-.25,-3,-5.4,-.25,-3,-14.5,-.25,-5.5],
// 4 15 14.5 -.25 -5.5 .2 -.25 -3.136 -2.3 -.25 -3 -14.5 -.25 -5.5
  [4,15,14.5,-.25,-5.5,.2,-.25,-3.136,-2.3,-.25,-3,-14.5,-.25,-5.5],
// 3 15 -.578 -.25 -2.905 -2.3 -.25 -3 .2 -.25 -3.136
  [3,15,-.578,-.25,-2.905,-2.3,-.25,-3,.2,-.25,-3.136],
// 4 15 .2 -.25 -3.136 14.5 -.25 -5.5 5.01 -.25 -3 .978 -.25 -2.905
  [4,15,.2,-.25,-3.136,14.5,-.25,-5.5,5.01,-.25,-3,.978,-.25,-2.905],
// 3 15 6.01 -.25 -3 5.01 -.25 -3 14.5 -.25 -5.5
  [3,15,6.01,-.25,-3,5.01,-.25,-3,14.5,-.25,-5.5],
// 4 15 14.5 -.25 -5.5 9.4 -.25 -2.994 8.811 -.25 -2.842 6.01 -.25 -3
  [4,15,14.5,-.25,-5.5,9.4,-.25,-2.994,8.811,-.25,-2.842,6.01,-.25,-3],
// 3 15 9.7 -.25 -2.994 9.4 -.25 -2.994 14.5 -.25 -5.5
  [3,15,9.7,-.25,-2.994,9.4,-.25,-2.994,14.5,-.25,-5.5],
// 4 15 9.7 -.25 -2.994 14.5 -.25 -5.5 15.5 -.25 -4.5 10.289 -.25 -2.842
  [4,15,9.7,-.25,-2.994,14.5,-.25,-5.5,15.5,-.25,-4.5,10.289,-.25,-2.842],
// 3 15 10.789 -.25 -2.41 10.289 -.25 -2.842 15.5 -.25 -4.5
  [3,15,10.789,-.25,-2.41,10.289,-.25,-2.842,15.5,-.25,-4.5],
// 3 15 11.123 -.25 -1.763 10.789 -.25 -2.41 15.5 -.25 -4.5
  [3,15,11.123,-.25,-1.763,10.789,-.25,-2.41,15.5,-.25,-4.5],
// 3 15 11.19 -.25 -1 11.123 -.25 -1.763 15.5 -.25 -4.5
  [3,15,11.19,-.25,-1,11.123,-.25,-1.763,15.5,-.25,-4.5],
// 4 15 15.5 -.25 4.5 11.123 -.25 -.237 11.19 -.25 -1 15.5 -.25 -4.5
  [4,15,15.5,-.25,4.5,11.123,-.25,-.237,11.19,-.25,-1,15.5,-.25,-4.5],
// 4 15 10.789 -.25 .41 11.123 -.25 -.237 15.5 -.25 4.5 10.95 -.25 1.5
  [4,15,10.789,-.25,.41,11.123,-.25,-.237,15.5,-.25,4.5,10.95,-.25,1.5],
// 3 15 15.5 -.25 4.5 10.95 -.25 2.7 10.95 -.25 1.5
  [3,15,15.5,-.25,4.5,10.95,-.25,2.7,10.95,-.25,1.5],
// 4 15 8.4 -.25 2.7 10.95 -.25 2.7 15.5 -.25 4.5 14.5 -.25 5.5
  [4,15,8.4,-.25,2.7,10.95,-.25,2.7,15.5,-.25,4.5,14.5,-.25,5.5],
// 3 15 14.5 -.25 5.5 7.4 -.25 2.7 8.4 -.25 2.7
  [3,15,14.5,-.25,5.5,7.4,-.25,2.7,8.4,-.25,2.7],
// 3 15 14.5 -.25 5.5 4.3 -.25 2.7 7.4 -.25 2.7
  [3,15,14.5,-.25,5.5,4.3,-.25,2.7,7.4,-.25,2.7],
// 4 15 -14.5 -.25 5.5 .2 -.25 2.936 4.3 -.25 2.7 14.5 -.25 5.5
  [4,15,-14.5,-.25,5.5,.2,-.25,2.936,4.3,-.25,2.7,14.5,-.25,5.5],
// 3 15 .2 -.25 2.936 .978 -.25 2.705 4.3 -.25 2.7
  [3,15,.2,-.25,2.936,.978,-.25,2.705,4.3,-.25,2.7],
// 4 15 -15.5 -.25 4.5 -10.8 -.25 2.8 -9.3 -.25 2.8 -14.5 -.25 5.5
  [4,15,-15.5,-.25,4.5,-10.8,-.25,2.8,-9.3,-.25,2.8,-14.5,-.25,5.5],
// 3 15 -14.5 -.25 5.5 -9.3 -.25 2.8 -7.9 -.25 2.8
  [3,15,-14.5,-.25,5.5,-9.3,-.25,2.8,-7.9,-.25,2.8],
// 3 15 -14.5 -.25 5.5 -7.9 -.25 2.8 -6.4 -.25 2.8
  [3,15,-14.5,-.25,5.5,-7.9,-.25,2.8,-6.4,-.25,2.8],
// 3 15 -14.5 -.25 5.5 -6.4 -.25 2.8 -5.4 -.25 2.8
  [3,15,-14.5,-.25,5.5,-6.4,-.25,2.8,-5.4,-.25,2.8],
// 4 15 .2 -.25 2.936 -14.5 -.25 5.5 -5.4 -.25 2.8 -4.3 -.25 2.8
  [4,15,.2,-.25,2.936,-14.5,-.25,5.5,-5.4,-.25,2.8,-4.3,-.25,2.8],
// 3 15 .2 -.25 2.936 -4.3 -.25 2.8 -.578 -.25 2.705
  [3,15,.2,-.25,2.936,-4.3,-.25,2.8,-.578,-.25,2.705],
// 
// 1 16 16.5 0 6.5 1 0 0 0 -1 0 0 0 1 1-4chrd.dat
  [1,16,16.5,0,6.5,1,0,0,0,-1,0,0,0,1, ldraw_lib__1_4chrd()],
// 1 16 16.5 0 -6.5 0 0 1 0 -1 0 -1 0 0 1-4chrd.dat
  [1,16,16.5,0,-6.5,0,0,1,0,-1,0,-1,0,0, ldraw_lib__1_4chrd()],
// 1 16 -16.5 0 -6.5 -1 0 0 0 -1 0 0 0 -1 1-4chrd.dat
  [1,16,-16.5,0,-6.5,-1,0,0,0,-1,0,0,0,-1, ldraw_lib__1_4chrd()],
// 1 16 -16.5 0 6.5 0 0 -1 0 -1 0 1 0 0 1-4chrd.dat
  [1,16,-16.5,0,6.5,0,0,-1,0,-1,0,1,0,0, ldraw_lib__1_4chrd()],
// 4 16 16.5 0 -7.5 -16.5 0 -7.5 -17.5 0 -6.5 17.5 0 -6.5
  [4,16,16.5,0,-7.5,-16.5,0,-7.5,-17.5,0,-6.5,17.5,0,-6.5],
// 4 16 17.5 0 6.5 17.5 0 -6.5 -17.5 0 -6.5 -17.5 0 6.5
  [4,16,17.5,0,6.5,17.5,0,-6.5,-17.5,0,-6.5,-17.5,0,6.5],
// 4 16 17.5 0 6.5 -17.5 0 6.5 -16.5 0 7.5 16.5 0 7.5
  [4,16,17.5,0,6.5,-17.5,0,6.5,-16.5,0,7.5,16.5,0,7.5],
// 
// 1 16 16.5 -.25 6.5 1 0 0 0 .25 0 0 0 1 1-4cyli.dat
  [1,16,16.5,-.25,6.5,1,0,0,0,.25,0,0,0,1, ldraw_lib__1_4cyli()],
// 1 16 -16.5 -.25 6.5 0 0 -1 0 .25 0 1 0 0 1-4cyli.dat
  [1,16,-16.5,-.25,6.5,0,0,-1,0,.25,0,1,0,0, ldraw_lib__1_4cyli()],
// 1 16 -16.5 -.25 -6.5 -1 0 0 0 .25 0 0 0 -1 1-4cyli.dat
  [1,16,-16.5,-.25,-6.5,-1,0,0,0,.25,0,0,0,-1, ldraw_lib__1_4cyli()],
// 1 16 16.5 -.25 -6.5 0 0 1 0 .25 0 -1 0 0 1-4cyli.dat
  [1,16,16.5,-.25,-6.5,0,0,1,0,.25,0,-1,0,0, ldraw_lib__1_4cyli()],
// 4 16 16.5 -.25 -7.5 -16.5 -.25 -7.5 -16.5 0 -7.5 16.5 0 -7.5
  [4,16,16.5,-.25,-7.5,-16.5,-.25,-7.5,-16.5,0,-7.5,16.5,0,-7.5],
// 4 16 17.5 -.25 6.5 17.5 -.25 -6.5 17.5 0 -6.5 17.5 0 6.5
  [4,16,17.5,-.25,6.5,17.5,-.25,-6.5,17.5,0,-6.5,17.5,0,6.5],
// 4 16 -16.5 -.25 7.5 16.5 -.25 7.5 16.5 0 7.5 -16.5 0 7.5
  [4,16,-16.5,-.25,7.5,16.5,-.25,7.5,16.5,0,7.5,-16.5,0,7.5],
// 4 16 -17.5 -.25 -6.5 -17.5 -.25 6.5 -17.5 0 6.5 -17.5 0 -6.5
  [4,16,-17.5,-.25,-6.5,-17.5,-.25,6.5,-17.5,0,6.5,-17.5,0,-6.5],
];
module ldraw_lib__6152075a(step=0, col=false, unit=2/5, alt=false, line=0.2, solid=!$preview)
    makepoly(ldraw_lib__6152075a(), step=step, col=col, unit=unit, alt=alt, line=line, solid=solid);
ldraw_lib__6152075a(line=0.2);
